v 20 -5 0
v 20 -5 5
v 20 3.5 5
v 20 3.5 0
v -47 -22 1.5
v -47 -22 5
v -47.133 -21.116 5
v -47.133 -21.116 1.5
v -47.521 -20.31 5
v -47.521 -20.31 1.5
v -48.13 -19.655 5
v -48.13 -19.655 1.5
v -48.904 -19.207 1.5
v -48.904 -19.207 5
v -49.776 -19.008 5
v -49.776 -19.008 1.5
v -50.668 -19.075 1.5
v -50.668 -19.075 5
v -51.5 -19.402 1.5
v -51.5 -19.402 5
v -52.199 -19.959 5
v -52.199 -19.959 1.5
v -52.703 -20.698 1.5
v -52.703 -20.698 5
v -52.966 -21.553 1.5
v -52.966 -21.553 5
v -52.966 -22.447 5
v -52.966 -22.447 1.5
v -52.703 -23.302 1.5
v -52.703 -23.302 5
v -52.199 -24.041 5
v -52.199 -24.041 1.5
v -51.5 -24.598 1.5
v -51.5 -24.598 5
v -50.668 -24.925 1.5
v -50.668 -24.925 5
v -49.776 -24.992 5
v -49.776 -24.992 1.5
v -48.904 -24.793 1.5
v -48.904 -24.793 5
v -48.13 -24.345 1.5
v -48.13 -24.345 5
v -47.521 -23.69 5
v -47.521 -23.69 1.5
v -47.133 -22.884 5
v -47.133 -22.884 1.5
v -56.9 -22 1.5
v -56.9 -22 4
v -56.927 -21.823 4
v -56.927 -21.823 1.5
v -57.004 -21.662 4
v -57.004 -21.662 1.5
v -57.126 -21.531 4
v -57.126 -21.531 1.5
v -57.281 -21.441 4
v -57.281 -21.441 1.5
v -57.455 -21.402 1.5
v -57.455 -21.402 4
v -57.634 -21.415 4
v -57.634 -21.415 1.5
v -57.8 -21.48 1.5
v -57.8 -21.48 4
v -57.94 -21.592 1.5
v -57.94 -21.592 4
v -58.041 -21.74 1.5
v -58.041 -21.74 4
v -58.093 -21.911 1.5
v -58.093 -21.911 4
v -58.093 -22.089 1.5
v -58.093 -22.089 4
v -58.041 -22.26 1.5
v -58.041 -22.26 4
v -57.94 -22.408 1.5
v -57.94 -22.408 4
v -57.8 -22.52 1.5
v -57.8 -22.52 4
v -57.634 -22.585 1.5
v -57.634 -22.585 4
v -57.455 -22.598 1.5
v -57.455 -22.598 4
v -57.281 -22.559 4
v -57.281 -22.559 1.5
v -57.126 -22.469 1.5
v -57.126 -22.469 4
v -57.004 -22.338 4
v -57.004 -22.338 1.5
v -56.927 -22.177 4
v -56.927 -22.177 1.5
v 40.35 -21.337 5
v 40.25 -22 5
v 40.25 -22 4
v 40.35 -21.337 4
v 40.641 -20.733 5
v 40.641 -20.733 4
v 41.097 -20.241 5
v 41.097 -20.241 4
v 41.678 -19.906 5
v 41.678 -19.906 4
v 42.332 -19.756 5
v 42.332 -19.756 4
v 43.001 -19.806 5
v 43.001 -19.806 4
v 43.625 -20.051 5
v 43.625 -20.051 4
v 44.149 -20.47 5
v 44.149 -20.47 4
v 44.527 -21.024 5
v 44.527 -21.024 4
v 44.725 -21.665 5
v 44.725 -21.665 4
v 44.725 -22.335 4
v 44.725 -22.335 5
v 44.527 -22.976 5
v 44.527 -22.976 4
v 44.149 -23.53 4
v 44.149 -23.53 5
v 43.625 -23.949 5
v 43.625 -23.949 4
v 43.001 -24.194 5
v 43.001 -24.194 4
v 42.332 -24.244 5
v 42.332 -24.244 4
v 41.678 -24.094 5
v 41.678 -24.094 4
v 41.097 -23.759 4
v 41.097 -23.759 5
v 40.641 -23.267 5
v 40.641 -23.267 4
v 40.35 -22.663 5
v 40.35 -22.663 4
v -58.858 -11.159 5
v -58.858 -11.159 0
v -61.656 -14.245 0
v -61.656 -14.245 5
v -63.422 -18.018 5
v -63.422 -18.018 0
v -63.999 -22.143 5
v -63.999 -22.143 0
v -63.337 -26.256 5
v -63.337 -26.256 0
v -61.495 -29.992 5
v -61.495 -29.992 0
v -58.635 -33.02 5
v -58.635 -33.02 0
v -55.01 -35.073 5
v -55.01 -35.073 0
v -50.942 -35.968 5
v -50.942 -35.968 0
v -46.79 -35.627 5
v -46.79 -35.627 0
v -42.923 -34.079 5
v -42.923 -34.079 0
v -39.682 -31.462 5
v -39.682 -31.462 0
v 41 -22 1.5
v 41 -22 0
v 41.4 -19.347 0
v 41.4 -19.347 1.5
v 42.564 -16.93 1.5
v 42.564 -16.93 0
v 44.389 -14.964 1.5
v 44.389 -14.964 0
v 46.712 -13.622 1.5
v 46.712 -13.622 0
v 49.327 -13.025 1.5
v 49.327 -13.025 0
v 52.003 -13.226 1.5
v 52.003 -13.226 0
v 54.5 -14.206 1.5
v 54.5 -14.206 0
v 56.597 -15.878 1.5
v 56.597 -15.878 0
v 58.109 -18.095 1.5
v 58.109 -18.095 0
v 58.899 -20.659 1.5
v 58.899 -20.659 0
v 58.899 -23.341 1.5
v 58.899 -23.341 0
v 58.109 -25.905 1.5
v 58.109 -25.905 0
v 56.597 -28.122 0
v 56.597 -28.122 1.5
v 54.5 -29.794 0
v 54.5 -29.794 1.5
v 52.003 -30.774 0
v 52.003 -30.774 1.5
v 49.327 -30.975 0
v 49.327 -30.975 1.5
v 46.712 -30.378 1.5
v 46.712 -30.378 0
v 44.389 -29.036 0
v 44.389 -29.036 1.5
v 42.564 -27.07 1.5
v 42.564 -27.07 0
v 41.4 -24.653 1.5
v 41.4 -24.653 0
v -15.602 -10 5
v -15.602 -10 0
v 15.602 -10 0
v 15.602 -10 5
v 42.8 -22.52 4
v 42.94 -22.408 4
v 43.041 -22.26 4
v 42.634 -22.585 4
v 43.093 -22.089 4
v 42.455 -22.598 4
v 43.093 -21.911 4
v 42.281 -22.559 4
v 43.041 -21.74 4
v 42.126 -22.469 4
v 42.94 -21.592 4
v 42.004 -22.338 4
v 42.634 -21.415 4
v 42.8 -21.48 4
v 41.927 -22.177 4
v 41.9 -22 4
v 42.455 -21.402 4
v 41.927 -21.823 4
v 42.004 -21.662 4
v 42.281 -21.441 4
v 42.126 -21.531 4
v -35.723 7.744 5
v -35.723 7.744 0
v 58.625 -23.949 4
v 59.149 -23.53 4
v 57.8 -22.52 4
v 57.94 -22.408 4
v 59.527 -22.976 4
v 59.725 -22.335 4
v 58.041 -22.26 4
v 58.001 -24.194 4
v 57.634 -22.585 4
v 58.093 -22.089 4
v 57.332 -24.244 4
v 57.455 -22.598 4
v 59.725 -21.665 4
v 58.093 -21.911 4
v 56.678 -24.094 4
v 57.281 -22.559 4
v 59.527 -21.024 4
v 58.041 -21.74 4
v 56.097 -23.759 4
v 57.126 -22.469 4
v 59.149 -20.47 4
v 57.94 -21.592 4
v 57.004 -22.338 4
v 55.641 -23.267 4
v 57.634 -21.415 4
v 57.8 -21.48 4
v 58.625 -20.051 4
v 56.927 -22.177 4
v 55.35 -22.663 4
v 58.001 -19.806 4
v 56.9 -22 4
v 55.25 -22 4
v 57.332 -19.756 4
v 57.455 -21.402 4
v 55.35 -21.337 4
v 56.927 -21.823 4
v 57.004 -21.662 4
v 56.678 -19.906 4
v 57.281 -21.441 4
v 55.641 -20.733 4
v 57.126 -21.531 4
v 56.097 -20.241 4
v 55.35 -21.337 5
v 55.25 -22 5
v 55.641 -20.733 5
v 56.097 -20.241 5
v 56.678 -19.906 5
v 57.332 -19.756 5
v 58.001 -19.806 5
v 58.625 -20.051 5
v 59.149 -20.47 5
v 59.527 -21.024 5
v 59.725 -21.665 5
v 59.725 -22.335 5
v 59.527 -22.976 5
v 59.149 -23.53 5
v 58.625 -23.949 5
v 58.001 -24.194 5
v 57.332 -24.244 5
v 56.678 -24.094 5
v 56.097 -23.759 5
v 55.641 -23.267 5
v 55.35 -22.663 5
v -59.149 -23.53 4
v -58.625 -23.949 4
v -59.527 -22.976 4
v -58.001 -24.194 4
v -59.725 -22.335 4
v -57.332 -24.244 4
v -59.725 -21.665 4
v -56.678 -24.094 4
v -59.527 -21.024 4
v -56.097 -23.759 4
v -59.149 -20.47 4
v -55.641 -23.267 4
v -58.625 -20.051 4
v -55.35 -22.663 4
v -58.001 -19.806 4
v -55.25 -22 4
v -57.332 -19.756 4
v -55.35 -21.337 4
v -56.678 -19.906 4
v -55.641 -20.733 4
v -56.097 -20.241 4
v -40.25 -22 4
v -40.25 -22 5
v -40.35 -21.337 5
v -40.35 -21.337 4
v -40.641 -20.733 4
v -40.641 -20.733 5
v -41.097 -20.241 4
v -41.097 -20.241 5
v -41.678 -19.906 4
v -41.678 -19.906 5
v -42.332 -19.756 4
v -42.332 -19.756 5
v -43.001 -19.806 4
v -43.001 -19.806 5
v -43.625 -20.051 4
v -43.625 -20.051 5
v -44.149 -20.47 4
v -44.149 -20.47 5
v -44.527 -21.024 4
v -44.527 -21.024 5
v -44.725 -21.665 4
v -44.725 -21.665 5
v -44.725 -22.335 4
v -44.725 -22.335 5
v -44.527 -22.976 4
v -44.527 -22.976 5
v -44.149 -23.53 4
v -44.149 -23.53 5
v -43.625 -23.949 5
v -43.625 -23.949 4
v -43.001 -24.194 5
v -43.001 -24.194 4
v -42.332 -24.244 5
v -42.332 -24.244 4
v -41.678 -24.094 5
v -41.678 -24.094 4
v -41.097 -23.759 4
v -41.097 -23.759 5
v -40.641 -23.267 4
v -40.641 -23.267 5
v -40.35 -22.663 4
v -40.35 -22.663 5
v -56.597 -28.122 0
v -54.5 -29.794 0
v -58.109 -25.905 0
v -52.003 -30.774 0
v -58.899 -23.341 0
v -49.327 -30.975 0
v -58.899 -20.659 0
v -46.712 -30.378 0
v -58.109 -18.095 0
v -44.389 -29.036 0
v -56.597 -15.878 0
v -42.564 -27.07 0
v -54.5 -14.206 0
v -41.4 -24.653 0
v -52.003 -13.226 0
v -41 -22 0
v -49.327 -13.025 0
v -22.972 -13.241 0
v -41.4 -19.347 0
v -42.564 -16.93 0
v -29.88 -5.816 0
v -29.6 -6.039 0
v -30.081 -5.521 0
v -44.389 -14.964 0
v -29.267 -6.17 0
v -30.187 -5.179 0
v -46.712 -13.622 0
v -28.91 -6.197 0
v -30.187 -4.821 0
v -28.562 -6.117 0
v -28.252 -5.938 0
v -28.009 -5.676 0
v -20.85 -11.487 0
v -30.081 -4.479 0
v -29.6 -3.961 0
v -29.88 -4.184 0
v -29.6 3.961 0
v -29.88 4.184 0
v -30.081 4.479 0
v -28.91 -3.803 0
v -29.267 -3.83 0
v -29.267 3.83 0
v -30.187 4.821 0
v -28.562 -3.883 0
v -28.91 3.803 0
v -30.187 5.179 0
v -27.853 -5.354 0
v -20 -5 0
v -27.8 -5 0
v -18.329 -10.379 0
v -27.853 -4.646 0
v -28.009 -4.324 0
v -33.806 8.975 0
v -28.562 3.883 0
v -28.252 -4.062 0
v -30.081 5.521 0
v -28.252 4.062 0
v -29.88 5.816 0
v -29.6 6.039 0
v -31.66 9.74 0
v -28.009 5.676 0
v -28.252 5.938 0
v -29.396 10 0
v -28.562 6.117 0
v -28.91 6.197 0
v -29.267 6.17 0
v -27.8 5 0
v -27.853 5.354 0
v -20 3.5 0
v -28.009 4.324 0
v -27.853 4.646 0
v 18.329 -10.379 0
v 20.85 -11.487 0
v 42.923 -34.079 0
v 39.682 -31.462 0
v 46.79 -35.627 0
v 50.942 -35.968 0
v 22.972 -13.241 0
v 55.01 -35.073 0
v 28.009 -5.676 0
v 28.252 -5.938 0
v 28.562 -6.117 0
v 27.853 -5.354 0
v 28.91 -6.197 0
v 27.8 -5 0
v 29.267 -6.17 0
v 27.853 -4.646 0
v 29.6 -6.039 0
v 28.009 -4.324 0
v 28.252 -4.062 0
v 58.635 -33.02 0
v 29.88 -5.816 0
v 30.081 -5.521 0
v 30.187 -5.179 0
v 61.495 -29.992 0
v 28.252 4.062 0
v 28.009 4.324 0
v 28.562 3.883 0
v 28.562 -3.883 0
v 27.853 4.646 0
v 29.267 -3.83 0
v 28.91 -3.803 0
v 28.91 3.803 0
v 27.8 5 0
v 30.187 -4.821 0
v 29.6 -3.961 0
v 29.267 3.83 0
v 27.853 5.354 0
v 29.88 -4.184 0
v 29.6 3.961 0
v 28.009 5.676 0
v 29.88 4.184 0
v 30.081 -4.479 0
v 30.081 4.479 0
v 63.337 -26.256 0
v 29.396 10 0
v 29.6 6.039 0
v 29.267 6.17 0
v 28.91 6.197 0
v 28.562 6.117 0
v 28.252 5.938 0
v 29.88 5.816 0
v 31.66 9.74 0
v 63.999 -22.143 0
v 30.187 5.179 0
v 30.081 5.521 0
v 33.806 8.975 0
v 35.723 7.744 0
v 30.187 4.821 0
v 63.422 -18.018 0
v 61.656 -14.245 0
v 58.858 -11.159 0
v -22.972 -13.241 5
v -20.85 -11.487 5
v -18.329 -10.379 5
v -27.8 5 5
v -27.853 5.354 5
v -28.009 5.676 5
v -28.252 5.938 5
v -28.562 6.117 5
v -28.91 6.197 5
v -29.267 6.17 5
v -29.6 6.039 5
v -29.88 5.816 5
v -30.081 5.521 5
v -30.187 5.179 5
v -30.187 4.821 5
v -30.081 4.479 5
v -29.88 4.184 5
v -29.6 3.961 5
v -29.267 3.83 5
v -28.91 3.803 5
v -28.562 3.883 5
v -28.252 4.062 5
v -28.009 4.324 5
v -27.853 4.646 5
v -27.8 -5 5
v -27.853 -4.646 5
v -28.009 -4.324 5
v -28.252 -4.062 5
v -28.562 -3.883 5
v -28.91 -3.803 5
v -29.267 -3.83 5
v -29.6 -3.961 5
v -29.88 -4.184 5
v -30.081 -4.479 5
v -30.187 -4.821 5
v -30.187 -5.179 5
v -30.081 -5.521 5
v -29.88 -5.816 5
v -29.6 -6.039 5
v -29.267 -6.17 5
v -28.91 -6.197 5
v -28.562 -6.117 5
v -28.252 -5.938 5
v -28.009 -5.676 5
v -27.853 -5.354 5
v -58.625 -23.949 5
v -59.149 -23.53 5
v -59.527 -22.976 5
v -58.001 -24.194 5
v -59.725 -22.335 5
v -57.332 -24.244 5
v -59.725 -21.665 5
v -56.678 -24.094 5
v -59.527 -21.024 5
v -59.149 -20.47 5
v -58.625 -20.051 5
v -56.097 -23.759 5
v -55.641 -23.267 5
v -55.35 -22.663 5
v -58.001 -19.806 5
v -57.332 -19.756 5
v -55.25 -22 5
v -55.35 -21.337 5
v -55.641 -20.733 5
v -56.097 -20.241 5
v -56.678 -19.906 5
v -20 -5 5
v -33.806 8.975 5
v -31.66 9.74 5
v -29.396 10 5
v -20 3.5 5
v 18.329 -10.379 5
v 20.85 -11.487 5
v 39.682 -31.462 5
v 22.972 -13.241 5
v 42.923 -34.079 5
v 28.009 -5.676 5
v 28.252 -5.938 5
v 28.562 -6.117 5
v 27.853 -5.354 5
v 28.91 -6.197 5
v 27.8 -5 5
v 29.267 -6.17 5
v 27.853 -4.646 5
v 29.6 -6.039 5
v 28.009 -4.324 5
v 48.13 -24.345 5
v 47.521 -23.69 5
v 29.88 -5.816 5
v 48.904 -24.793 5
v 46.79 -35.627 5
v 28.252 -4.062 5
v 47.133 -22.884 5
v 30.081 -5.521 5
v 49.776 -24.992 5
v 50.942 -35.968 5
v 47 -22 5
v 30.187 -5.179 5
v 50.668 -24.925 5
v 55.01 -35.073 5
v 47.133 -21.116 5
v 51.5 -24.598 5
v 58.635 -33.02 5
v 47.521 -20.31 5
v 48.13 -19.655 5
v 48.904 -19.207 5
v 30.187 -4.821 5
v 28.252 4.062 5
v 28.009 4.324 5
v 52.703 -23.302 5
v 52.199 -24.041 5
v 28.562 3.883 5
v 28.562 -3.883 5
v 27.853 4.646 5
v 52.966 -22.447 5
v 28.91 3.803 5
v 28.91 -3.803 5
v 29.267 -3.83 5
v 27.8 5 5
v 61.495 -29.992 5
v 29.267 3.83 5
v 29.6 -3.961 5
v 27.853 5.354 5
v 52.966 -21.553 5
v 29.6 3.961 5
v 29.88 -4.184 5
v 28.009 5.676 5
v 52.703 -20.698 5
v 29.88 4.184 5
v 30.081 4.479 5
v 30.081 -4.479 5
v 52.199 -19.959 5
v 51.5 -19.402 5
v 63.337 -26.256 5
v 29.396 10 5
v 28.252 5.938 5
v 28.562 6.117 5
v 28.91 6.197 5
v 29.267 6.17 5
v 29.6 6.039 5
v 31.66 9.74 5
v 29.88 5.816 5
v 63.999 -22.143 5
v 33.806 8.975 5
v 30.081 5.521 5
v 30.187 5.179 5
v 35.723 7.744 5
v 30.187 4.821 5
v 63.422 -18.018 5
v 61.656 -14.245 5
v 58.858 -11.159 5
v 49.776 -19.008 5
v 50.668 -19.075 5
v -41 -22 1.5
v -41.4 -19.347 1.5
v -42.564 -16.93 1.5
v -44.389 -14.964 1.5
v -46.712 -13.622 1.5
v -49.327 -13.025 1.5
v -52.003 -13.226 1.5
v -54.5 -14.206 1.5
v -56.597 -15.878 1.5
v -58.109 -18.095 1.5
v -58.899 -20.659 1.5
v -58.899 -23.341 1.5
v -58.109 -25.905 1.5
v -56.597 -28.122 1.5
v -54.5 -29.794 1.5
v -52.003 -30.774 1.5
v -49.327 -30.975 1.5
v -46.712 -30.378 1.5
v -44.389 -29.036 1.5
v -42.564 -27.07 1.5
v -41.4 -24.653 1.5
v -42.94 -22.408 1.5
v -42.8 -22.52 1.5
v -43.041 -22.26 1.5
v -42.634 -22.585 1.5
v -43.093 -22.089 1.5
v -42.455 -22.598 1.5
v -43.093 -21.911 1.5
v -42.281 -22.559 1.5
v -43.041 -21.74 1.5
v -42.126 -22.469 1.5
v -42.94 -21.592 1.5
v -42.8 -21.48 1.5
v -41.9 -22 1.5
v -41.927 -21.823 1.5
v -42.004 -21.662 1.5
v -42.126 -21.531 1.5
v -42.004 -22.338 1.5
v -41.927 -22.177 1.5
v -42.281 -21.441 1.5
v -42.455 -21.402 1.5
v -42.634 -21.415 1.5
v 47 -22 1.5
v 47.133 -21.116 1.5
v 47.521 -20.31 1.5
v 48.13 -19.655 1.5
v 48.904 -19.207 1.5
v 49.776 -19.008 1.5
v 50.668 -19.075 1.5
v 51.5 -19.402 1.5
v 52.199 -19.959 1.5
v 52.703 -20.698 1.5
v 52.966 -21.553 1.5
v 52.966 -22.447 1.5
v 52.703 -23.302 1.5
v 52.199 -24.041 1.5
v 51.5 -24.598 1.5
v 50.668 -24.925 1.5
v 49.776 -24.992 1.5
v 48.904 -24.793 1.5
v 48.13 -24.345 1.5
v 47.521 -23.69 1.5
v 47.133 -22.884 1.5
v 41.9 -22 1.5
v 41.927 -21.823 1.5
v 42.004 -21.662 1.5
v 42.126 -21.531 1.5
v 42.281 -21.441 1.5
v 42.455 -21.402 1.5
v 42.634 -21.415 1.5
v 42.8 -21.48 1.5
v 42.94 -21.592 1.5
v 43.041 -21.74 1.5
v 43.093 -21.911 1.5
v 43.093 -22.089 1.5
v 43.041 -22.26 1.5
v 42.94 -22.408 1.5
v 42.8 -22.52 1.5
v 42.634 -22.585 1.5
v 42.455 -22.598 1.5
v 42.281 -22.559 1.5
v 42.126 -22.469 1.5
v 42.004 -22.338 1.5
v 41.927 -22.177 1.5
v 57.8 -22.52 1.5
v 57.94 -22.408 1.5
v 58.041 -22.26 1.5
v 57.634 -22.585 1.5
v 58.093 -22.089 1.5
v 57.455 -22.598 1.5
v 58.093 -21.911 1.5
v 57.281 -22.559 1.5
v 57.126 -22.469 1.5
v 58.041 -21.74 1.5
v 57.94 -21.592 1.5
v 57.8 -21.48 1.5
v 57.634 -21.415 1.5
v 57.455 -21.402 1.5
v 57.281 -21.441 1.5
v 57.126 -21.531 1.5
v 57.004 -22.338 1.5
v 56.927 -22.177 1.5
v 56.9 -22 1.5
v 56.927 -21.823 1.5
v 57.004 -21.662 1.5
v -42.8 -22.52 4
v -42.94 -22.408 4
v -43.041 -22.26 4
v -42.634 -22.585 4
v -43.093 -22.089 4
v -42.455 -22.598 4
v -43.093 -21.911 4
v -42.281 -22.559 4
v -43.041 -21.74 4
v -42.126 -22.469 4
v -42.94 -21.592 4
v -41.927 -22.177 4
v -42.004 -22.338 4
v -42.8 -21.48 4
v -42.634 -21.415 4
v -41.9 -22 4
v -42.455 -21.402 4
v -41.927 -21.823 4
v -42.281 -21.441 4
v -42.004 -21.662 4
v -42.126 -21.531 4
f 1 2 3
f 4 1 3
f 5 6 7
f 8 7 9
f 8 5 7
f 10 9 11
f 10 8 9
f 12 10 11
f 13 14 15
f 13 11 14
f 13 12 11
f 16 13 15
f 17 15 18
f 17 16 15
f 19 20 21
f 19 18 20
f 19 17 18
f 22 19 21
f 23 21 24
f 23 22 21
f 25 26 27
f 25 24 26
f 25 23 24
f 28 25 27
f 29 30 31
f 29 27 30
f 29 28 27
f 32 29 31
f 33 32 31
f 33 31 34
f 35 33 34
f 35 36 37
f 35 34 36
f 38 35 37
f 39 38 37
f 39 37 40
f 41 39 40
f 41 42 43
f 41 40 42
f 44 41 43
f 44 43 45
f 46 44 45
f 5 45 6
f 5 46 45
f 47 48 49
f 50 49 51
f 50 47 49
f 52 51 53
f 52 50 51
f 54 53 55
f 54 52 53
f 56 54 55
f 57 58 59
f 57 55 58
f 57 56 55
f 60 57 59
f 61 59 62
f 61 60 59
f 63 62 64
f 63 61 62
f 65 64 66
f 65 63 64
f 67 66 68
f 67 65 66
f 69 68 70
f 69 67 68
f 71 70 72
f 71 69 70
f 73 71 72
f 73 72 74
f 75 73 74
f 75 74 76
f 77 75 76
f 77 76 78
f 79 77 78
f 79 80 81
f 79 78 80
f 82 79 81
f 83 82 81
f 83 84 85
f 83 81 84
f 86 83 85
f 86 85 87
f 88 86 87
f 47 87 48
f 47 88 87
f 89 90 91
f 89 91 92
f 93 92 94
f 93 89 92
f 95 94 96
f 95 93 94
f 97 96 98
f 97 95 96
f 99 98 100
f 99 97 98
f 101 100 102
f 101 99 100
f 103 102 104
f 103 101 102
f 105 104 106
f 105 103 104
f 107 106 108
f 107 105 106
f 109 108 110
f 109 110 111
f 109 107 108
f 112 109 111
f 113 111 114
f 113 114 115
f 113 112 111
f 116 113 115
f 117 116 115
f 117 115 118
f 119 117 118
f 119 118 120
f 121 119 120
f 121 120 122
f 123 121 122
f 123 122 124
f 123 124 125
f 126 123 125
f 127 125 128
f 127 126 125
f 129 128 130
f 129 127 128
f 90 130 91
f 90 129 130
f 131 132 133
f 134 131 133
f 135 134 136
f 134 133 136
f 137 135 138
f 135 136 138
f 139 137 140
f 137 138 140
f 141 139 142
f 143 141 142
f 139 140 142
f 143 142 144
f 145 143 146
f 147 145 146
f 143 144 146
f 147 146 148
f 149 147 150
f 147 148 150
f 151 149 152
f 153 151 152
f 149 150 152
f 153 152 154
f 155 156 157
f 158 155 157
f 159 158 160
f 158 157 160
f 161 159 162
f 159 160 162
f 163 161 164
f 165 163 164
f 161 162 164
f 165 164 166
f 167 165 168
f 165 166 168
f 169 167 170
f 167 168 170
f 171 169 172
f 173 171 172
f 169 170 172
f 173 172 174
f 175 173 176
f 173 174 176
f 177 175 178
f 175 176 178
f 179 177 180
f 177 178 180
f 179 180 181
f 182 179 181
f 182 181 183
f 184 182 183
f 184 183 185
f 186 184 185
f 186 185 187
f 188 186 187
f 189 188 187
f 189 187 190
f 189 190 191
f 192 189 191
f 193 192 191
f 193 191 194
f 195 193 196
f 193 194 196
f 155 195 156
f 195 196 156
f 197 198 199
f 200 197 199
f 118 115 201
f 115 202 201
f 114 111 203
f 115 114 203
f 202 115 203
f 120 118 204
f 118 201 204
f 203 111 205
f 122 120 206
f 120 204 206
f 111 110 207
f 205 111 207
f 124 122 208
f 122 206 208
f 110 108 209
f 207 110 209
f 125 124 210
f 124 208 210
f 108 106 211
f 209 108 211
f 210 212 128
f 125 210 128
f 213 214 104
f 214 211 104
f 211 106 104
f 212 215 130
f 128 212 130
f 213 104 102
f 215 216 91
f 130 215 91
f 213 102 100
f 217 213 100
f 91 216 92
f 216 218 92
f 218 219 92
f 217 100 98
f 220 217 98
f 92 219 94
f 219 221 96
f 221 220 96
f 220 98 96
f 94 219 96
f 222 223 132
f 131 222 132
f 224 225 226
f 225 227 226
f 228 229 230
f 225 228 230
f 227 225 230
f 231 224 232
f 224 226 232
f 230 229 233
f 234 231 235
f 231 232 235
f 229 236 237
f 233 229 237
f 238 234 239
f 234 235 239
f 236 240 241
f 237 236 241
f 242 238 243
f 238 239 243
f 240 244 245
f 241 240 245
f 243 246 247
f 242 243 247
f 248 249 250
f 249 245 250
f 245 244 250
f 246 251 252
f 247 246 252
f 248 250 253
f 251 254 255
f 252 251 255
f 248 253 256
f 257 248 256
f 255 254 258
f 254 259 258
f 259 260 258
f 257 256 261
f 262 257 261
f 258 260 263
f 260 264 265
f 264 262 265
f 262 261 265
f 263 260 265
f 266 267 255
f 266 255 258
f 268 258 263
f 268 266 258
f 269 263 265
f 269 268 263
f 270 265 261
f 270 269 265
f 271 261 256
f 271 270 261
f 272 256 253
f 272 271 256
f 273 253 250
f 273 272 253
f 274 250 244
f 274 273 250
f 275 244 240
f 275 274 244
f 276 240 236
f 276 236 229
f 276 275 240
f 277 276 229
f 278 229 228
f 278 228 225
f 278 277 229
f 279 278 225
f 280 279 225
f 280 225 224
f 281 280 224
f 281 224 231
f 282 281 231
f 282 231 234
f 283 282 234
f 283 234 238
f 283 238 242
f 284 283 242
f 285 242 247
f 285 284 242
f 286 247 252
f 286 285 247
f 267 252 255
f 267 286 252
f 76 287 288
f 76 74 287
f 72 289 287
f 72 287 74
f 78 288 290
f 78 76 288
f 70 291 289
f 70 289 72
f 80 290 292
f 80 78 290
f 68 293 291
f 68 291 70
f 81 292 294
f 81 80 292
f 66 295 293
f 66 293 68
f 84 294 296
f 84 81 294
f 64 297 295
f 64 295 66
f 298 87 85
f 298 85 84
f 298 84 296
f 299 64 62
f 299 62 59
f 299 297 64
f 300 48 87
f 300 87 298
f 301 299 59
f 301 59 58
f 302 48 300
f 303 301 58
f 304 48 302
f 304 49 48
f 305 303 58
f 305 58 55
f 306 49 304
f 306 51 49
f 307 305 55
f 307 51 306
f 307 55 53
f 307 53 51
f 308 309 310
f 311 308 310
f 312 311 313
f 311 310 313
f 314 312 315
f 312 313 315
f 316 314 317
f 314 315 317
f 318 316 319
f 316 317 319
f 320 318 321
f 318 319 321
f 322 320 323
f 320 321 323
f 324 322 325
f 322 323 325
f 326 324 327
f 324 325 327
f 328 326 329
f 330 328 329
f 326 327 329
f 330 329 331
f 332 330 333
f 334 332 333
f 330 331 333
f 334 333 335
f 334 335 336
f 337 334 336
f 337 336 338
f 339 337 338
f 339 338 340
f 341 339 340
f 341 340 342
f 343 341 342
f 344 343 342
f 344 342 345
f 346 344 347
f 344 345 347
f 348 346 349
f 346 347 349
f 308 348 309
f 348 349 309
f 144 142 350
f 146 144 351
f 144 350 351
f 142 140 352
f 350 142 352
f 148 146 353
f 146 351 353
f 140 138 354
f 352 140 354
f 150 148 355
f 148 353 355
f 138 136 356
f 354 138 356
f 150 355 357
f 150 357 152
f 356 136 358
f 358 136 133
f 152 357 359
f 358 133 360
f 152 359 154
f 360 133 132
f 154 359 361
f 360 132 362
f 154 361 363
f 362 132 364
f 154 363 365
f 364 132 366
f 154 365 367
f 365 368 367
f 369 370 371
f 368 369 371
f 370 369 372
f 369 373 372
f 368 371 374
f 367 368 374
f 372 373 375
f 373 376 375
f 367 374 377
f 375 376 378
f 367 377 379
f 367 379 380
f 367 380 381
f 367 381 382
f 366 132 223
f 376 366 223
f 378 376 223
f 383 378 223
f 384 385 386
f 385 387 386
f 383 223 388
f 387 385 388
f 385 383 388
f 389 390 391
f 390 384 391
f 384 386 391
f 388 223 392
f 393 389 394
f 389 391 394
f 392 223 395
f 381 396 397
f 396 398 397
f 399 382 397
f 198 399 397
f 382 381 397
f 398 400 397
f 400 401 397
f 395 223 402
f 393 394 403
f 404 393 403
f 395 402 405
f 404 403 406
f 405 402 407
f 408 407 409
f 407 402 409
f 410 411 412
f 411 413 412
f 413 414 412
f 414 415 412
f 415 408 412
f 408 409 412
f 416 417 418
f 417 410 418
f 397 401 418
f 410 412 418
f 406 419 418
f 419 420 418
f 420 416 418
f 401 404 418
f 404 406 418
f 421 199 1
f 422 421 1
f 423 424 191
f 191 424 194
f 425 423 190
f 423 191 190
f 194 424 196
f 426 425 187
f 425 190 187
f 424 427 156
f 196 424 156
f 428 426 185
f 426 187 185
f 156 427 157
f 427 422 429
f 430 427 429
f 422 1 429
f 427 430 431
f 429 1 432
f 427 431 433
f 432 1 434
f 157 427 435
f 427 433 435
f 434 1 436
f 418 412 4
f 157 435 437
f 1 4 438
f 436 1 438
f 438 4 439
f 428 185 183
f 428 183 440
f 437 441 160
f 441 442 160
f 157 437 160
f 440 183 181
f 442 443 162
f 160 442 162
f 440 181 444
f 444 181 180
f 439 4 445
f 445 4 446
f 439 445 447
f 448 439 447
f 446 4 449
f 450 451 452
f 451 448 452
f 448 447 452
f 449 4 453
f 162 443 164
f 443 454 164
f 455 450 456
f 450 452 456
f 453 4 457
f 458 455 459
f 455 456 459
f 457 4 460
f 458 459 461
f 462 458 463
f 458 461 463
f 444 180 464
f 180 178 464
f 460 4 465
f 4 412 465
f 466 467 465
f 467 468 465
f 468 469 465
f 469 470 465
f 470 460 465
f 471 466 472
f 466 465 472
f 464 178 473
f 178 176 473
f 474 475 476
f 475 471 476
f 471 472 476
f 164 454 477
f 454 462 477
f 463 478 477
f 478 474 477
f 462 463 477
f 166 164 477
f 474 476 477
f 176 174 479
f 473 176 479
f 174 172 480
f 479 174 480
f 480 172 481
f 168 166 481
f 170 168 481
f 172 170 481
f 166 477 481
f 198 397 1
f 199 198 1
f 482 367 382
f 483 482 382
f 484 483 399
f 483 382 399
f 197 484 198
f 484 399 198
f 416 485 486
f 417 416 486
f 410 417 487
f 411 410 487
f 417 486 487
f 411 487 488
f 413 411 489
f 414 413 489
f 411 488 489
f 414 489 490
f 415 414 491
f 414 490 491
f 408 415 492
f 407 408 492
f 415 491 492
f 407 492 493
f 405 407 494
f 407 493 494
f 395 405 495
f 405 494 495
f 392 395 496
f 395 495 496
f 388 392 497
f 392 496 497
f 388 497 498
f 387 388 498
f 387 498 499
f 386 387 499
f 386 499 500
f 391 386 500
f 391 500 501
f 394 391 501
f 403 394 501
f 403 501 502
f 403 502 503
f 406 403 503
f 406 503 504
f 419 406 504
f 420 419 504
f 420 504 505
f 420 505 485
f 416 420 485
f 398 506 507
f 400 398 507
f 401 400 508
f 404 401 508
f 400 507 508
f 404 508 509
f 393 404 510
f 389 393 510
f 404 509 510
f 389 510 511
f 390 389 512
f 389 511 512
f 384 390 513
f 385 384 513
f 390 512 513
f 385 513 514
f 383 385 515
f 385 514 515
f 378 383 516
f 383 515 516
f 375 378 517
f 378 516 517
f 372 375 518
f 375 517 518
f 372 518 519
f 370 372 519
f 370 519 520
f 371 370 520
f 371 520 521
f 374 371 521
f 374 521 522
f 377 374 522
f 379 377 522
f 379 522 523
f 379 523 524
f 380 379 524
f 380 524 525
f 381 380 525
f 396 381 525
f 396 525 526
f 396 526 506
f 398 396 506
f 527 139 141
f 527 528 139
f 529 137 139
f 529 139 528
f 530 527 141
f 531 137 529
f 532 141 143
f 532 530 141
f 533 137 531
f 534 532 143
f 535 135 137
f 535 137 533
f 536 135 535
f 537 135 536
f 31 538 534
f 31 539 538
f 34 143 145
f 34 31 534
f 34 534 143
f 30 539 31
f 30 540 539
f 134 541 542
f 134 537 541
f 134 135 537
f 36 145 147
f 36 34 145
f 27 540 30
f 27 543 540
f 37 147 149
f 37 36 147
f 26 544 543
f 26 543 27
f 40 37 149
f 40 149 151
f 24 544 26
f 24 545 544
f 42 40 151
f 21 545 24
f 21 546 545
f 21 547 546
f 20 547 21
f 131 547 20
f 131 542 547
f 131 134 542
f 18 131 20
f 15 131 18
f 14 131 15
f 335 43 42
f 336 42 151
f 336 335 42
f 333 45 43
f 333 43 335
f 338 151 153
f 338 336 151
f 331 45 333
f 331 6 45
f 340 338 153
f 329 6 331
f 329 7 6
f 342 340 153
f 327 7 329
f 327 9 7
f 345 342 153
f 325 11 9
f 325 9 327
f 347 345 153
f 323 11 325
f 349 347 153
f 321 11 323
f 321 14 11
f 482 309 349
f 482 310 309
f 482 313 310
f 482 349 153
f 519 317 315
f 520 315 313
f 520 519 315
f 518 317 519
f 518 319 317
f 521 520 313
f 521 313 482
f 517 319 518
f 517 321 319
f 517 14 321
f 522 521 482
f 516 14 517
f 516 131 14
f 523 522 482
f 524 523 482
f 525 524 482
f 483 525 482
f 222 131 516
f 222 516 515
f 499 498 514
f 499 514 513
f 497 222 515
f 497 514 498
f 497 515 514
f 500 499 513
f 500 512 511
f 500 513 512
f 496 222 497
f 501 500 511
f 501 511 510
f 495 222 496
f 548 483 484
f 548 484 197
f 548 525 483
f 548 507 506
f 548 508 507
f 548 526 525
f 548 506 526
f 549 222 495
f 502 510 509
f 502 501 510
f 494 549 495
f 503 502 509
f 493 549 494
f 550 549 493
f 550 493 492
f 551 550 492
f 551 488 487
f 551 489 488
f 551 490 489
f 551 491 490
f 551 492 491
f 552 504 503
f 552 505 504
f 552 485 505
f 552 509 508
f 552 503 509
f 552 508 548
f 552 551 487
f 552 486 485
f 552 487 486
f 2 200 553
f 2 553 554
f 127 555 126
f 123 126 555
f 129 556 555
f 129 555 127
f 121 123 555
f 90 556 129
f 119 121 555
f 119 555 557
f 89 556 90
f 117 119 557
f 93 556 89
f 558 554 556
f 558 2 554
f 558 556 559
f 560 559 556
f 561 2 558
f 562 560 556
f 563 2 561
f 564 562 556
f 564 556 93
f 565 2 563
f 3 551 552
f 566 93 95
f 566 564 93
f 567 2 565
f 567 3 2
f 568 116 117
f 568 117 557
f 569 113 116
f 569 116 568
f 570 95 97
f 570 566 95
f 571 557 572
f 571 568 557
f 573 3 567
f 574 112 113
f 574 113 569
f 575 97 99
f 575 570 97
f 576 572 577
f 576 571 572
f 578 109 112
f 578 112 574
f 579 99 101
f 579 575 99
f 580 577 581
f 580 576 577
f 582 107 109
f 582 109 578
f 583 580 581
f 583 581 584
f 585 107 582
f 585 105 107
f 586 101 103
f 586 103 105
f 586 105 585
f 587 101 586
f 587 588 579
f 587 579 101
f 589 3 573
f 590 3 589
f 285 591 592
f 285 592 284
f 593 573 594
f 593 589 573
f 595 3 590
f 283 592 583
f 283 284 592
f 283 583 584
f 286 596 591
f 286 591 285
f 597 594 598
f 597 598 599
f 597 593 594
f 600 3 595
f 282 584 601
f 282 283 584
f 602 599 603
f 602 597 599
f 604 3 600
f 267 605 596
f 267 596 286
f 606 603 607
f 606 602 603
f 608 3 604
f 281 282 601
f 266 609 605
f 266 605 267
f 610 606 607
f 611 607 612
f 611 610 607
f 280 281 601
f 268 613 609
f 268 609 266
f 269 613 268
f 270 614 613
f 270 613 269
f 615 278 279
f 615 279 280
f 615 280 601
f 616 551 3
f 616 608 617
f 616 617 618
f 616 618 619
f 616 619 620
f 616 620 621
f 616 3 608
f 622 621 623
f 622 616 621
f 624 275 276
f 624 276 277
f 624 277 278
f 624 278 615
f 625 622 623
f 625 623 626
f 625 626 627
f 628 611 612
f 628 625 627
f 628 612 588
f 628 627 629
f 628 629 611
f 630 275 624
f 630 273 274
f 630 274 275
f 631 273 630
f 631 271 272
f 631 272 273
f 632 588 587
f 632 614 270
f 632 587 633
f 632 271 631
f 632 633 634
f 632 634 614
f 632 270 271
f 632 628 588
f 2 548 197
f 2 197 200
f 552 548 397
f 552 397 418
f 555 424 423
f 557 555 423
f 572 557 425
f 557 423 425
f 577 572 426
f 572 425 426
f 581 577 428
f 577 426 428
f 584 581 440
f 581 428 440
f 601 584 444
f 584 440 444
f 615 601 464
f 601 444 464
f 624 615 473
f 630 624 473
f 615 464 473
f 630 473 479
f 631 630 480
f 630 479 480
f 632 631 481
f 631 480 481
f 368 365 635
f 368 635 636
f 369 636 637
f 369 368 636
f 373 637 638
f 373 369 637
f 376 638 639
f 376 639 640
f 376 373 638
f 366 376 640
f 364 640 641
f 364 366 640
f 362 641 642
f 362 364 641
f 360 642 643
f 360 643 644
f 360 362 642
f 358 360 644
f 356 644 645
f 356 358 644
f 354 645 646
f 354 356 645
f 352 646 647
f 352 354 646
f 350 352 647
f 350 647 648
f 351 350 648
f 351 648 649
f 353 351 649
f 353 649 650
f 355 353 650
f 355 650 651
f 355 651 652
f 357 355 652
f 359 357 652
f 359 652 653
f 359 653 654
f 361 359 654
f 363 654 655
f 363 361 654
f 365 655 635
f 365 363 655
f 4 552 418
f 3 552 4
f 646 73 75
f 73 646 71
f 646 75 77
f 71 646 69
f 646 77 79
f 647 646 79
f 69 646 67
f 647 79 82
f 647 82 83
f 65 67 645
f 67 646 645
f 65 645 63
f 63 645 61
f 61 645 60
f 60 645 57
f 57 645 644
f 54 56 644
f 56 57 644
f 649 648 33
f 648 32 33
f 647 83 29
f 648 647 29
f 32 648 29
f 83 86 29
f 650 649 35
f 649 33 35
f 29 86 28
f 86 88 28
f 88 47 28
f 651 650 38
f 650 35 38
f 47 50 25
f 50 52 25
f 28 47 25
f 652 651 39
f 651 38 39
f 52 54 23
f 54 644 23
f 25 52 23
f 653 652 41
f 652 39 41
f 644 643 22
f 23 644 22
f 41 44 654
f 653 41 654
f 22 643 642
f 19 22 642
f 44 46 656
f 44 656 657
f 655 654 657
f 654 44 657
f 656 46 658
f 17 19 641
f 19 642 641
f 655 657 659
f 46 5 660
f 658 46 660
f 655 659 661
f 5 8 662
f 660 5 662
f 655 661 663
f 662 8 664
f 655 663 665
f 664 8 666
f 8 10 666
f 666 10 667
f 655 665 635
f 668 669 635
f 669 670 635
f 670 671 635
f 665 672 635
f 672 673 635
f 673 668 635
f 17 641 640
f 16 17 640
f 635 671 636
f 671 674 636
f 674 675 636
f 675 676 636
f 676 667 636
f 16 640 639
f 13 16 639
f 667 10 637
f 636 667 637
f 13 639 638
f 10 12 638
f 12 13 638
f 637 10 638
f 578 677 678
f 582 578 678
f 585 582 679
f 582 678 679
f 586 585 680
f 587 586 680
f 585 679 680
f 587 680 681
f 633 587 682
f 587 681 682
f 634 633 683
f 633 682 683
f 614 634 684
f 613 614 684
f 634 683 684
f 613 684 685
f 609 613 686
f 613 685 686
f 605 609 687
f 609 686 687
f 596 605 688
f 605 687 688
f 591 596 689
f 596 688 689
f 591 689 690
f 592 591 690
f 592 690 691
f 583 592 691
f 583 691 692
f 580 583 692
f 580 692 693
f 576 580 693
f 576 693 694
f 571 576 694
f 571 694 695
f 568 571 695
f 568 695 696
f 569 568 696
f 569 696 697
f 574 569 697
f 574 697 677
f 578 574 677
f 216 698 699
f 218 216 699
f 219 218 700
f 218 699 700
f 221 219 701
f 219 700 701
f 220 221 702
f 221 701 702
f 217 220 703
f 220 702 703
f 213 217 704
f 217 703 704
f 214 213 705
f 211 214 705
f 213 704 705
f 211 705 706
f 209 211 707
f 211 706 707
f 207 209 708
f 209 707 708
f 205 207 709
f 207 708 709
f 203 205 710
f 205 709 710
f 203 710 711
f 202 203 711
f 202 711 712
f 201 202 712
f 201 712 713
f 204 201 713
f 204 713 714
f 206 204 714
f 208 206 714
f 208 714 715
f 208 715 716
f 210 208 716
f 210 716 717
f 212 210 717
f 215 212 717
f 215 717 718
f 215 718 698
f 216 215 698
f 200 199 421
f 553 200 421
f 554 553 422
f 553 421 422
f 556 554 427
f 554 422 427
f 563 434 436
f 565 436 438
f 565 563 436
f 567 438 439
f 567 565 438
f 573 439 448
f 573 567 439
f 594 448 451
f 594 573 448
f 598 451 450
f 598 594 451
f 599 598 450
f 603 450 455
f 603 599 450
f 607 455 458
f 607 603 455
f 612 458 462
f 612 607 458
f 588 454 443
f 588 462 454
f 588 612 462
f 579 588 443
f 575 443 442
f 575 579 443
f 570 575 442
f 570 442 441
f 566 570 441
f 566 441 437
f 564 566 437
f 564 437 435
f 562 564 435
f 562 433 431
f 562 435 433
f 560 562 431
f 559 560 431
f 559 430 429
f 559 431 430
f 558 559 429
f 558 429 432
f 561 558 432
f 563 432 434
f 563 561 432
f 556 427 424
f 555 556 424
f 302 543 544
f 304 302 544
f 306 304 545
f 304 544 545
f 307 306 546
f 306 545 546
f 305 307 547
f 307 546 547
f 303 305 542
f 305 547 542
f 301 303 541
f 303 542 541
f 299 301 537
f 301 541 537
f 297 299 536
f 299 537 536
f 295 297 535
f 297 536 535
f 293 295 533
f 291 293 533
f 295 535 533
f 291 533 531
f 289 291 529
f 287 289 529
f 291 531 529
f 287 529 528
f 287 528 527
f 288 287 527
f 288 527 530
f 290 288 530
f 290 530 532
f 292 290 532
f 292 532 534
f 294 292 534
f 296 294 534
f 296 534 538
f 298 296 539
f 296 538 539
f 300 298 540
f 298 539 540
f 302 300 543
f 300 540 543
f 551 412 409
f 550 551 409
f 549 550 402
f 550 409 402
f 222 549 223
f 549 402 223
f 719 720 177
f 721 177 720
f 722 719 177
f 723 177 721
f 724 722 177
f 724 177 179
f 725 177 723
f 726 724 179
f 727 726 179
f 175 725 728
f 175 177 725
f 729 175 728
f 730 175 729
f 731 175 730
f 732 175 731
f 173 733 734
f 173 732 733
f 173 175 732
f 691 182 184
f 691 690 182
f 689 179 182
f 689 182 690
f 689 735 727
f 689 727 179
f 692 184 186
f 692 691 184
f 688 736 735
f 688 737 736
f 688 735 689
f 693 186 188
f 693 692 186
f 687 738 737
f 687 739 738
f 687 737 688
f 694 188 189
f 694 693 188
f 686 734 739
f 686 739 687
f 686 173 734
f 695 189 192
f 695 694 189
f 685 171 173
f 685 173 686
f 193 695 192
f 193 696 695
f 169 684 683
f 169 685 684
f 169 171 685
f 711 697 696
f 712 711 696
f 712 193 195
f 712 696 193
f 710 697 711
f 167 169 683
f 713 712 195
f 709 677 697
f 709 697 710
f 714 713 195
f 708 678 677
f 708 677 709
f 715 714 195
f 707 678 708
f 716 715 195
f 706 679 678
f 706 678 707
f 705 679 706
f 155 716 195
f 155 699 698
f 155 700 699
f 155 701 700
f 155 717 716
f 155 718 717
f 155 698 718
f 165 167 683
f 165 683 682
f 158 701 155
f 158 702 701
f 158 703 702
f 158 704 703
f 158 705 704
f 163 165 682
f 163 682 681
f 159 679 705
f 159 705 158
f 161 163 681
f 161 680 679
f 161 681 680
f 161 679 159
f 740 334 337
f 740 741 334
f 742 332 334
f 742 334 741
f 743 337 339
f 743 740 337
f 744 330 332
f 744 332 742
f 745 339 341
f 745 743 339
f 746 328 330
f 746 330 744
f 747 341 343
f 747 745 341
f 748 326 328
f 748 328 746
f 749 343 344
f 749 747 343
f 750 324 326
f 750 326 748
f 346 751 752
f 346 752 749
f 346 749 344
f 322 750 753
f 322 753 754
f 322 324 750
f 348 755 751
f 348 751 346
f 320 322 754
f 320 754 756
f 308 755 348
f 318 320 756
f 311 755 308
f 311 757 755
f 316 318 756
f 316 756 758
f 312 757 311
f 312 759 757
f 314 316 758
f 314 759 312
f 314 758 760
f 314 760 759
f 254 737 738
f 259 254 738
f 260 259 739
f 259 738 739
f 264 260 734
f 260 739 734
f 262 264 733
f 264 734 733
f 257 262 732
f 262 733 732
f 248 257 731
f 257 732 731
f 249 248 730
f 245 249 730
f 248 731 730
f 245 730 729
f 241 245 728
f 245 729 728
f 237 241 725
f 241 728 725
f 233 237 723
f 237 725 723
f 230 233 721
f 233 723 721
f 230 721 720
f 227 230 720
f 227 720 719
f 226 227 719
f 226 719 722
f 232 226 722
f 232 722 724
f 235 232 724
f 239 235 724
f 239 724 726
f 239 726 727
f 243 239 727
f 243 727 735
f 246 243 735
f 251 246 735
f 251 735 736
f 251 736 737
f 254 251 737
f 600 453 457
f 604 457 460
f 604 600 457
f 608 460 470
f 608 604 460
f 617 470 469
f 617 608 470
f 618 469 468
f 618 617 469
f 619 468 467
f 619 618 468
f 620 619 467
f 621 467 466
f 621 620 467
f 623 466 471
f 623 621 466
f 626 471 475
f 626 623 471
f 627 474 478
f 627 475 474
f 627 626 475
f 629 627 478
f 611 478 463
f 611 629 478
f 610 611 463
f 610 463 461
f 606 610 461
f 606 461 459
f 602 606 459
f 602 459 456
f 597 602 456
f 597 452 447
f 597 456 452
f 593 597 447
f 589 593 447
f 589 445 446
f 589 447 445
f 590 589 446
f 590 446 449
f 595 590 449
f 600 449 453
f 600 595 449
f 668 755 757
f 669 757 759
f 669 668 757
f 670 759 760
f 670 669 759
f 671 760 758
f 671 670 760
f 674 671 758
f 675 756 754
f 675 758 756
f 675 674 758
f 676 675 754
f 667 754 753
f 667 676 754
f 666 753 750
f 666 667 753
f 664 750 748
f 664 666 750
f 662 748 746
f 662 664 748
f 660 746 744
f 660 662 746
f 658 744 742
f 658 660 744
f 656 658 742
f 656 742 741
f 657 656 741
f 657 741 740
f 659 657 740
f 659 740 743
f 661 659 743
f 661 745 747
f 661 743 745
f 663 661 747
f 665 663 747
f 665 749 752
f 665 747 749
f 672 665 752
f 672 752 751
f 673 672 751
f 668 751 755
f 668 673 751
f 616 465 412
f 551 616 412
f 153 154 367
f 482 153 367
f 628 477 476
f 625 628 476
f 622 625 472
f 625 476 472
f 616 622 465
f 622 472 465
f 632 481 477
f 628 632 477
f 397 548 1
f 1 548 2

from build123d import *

# Parameters (mm, degrees)
EXTRUDE_1_DEPTH     = 5
SKETCH_4_W          = 40
SKETCH_4_H          = 8.5
CUT_EXTRUDE_1_DEPTH = 5
SKETCH_5_R          = 1.2
CUT_EXTRUDE_2_DEPTH = 7
SKETCH_9_R          = 9
CUT_EXTRUDE_3_DEPTH = 1.5
SKETCH_10_R         = 3
SKETCH_10_R_2       = 0.6
CUT_EXTRUDE_4_DEPTH = 5
SKETCH_11_R         = 2.25
CUT_EXTRUDE_5_DEPTH = 1


with BuildPart() as part:
    # 草图3 → 凸台-拉伸1 (new body)
    with BuildSketch(Plane.XY):
        with BuildLine():
            Line((-35.723215038, 7.743839121), (-58.858024221, -11.158625231))
            ThreePointArc((-58.858024221, -11.158625231), (-60.178030432, -31.612892204), (-39.681768347, -31.462245799))
            Line((-39.681768347, -31.462245799), (-22.972363252, -13.241253001))
            ThreePointArc((-22.972363252, -13.241253001), (-19.627898346, -10.846108205), (-15.602197786, -10))
            Line((-15.602197786, -10), (15.602197786, -10))
            ThreePointArc((15.602197786, -10), (19.627898346, -10.846108205), (22.972363252, -13.241253001))
            Line((22.972363252, -13.241253001), (39.681768347, -31.462245799))
            ThreePointArc((39.681768347, -31.462245799), (60.178030432, -31.612892204), (58.858024221, -11.158625231))
            Line((58.858024221, -11.158625231), (35.723215038, 7.743839121))
            ThreePointArc((35.723215038, 7.743839121), (32.754745755, 9.419086771), (29.39605488, 10))
            Line((29.39605488, 10), (-29.39605488, 10))
            ThreePointArc((-29.39605488, 10), (-32.754745755, 9.419086771), (-35.723215038, 7.743839121))
        make_face()
    extrude(amount=EXTRUDE_1_DEPTH)

    # 草图4 → 切除-拉伸1 (cut)
    with BuildSketch(Plane.XY.offset(5)):
        with Locations((0, -0.75)):
            Rectangle(SKETCH_4_W, SKETCH_4_H)
    extrude(amount=-CUT_EXTRUDE_1_DEPTH, mode=Mode.SUBTRACT)

    # 草图5 → 切除-拉伸2 (cut)
    with BuildSketch(Plane.XY.offset(5)):
        with Locations((-29, -5)):
            Circle(SKETCH_5_R)
        with Locations((-29, 5)):
            Circle(SKETCH_5_R)
    cut_extrude_2 = extrude(amount=-CUT_EXTRUDE_2_DEPTH, mode=Mode.SUBTRACT)

    # 镜向1: 切除-拉伸2 across plane
    add(cut_extrude_2.mirror(Plane.ZY), mode=Mode.SUBTRACT)

    # 草图9 → 切除-拉伸3 (cut)
    with BuildSketch(Plane(origin=(0, 0, 0), x_dir=(-1, 0, 0), z_dir=(0, 0, -1))):
        with Locations((-50, -22)):
            Circle(SKETCH_9_R)
    cut_extrude_3 = extrude(amount=-CUT_EXTRUDE_3_DEPTH, mode=Mode.SUBTRACT)

    # 草图10 → 切除-拉伸4 (cut)
    with BuildSketch(Plane(origin=(0, 0, 1.5), x_dir=(-1, 0, 0), z_dir=(0, 0, -1))):
        with Locations((-50, -22)):
            Circle(SKETCH_10_R)
        with Locations((-57.5, -22)):
            Circle(SKETCH_10_R_2)
        with Locations((-42.5, -22)):
            Circle(SKETCH_10_R_2)
    cut_extrude_4 = extrude(amount=-CUT_EXTRUDE_4_DEPTH, mode=Mode.SUBTRACT)

    # 镜向3: 切除-拉伸3, 切除-拉伸4 across plane
    add(cut_extrude_3.mirror(Plane.ZY), mode=Mode.SUBTRACT)
    add(cut_extrude_4.mirror(Plane.ZY), mode=Mode.SUBTRACT)

    # 草图11 → 切除-拉伸5 (cut)
    with BuildSketch(Plane.XY.offset(5)):
        with Locations((-57.5, -22)):
            Circle(SKETCH_11_R)
        with Locations((-42.5, -22)):
            Circle(SKETCH_11_R)
    cut_extrude_5 = extrude(amount=-CUT_EXTRUDE_5_DEPTH, mode=Mode.SUBTRACT)

    # 镜向4: 切除-拉伸5 across plane
    add(cut_extrude_5.mirror(Plane.ZY), mode=Mode.SUBTRACT)


solid = part.part
